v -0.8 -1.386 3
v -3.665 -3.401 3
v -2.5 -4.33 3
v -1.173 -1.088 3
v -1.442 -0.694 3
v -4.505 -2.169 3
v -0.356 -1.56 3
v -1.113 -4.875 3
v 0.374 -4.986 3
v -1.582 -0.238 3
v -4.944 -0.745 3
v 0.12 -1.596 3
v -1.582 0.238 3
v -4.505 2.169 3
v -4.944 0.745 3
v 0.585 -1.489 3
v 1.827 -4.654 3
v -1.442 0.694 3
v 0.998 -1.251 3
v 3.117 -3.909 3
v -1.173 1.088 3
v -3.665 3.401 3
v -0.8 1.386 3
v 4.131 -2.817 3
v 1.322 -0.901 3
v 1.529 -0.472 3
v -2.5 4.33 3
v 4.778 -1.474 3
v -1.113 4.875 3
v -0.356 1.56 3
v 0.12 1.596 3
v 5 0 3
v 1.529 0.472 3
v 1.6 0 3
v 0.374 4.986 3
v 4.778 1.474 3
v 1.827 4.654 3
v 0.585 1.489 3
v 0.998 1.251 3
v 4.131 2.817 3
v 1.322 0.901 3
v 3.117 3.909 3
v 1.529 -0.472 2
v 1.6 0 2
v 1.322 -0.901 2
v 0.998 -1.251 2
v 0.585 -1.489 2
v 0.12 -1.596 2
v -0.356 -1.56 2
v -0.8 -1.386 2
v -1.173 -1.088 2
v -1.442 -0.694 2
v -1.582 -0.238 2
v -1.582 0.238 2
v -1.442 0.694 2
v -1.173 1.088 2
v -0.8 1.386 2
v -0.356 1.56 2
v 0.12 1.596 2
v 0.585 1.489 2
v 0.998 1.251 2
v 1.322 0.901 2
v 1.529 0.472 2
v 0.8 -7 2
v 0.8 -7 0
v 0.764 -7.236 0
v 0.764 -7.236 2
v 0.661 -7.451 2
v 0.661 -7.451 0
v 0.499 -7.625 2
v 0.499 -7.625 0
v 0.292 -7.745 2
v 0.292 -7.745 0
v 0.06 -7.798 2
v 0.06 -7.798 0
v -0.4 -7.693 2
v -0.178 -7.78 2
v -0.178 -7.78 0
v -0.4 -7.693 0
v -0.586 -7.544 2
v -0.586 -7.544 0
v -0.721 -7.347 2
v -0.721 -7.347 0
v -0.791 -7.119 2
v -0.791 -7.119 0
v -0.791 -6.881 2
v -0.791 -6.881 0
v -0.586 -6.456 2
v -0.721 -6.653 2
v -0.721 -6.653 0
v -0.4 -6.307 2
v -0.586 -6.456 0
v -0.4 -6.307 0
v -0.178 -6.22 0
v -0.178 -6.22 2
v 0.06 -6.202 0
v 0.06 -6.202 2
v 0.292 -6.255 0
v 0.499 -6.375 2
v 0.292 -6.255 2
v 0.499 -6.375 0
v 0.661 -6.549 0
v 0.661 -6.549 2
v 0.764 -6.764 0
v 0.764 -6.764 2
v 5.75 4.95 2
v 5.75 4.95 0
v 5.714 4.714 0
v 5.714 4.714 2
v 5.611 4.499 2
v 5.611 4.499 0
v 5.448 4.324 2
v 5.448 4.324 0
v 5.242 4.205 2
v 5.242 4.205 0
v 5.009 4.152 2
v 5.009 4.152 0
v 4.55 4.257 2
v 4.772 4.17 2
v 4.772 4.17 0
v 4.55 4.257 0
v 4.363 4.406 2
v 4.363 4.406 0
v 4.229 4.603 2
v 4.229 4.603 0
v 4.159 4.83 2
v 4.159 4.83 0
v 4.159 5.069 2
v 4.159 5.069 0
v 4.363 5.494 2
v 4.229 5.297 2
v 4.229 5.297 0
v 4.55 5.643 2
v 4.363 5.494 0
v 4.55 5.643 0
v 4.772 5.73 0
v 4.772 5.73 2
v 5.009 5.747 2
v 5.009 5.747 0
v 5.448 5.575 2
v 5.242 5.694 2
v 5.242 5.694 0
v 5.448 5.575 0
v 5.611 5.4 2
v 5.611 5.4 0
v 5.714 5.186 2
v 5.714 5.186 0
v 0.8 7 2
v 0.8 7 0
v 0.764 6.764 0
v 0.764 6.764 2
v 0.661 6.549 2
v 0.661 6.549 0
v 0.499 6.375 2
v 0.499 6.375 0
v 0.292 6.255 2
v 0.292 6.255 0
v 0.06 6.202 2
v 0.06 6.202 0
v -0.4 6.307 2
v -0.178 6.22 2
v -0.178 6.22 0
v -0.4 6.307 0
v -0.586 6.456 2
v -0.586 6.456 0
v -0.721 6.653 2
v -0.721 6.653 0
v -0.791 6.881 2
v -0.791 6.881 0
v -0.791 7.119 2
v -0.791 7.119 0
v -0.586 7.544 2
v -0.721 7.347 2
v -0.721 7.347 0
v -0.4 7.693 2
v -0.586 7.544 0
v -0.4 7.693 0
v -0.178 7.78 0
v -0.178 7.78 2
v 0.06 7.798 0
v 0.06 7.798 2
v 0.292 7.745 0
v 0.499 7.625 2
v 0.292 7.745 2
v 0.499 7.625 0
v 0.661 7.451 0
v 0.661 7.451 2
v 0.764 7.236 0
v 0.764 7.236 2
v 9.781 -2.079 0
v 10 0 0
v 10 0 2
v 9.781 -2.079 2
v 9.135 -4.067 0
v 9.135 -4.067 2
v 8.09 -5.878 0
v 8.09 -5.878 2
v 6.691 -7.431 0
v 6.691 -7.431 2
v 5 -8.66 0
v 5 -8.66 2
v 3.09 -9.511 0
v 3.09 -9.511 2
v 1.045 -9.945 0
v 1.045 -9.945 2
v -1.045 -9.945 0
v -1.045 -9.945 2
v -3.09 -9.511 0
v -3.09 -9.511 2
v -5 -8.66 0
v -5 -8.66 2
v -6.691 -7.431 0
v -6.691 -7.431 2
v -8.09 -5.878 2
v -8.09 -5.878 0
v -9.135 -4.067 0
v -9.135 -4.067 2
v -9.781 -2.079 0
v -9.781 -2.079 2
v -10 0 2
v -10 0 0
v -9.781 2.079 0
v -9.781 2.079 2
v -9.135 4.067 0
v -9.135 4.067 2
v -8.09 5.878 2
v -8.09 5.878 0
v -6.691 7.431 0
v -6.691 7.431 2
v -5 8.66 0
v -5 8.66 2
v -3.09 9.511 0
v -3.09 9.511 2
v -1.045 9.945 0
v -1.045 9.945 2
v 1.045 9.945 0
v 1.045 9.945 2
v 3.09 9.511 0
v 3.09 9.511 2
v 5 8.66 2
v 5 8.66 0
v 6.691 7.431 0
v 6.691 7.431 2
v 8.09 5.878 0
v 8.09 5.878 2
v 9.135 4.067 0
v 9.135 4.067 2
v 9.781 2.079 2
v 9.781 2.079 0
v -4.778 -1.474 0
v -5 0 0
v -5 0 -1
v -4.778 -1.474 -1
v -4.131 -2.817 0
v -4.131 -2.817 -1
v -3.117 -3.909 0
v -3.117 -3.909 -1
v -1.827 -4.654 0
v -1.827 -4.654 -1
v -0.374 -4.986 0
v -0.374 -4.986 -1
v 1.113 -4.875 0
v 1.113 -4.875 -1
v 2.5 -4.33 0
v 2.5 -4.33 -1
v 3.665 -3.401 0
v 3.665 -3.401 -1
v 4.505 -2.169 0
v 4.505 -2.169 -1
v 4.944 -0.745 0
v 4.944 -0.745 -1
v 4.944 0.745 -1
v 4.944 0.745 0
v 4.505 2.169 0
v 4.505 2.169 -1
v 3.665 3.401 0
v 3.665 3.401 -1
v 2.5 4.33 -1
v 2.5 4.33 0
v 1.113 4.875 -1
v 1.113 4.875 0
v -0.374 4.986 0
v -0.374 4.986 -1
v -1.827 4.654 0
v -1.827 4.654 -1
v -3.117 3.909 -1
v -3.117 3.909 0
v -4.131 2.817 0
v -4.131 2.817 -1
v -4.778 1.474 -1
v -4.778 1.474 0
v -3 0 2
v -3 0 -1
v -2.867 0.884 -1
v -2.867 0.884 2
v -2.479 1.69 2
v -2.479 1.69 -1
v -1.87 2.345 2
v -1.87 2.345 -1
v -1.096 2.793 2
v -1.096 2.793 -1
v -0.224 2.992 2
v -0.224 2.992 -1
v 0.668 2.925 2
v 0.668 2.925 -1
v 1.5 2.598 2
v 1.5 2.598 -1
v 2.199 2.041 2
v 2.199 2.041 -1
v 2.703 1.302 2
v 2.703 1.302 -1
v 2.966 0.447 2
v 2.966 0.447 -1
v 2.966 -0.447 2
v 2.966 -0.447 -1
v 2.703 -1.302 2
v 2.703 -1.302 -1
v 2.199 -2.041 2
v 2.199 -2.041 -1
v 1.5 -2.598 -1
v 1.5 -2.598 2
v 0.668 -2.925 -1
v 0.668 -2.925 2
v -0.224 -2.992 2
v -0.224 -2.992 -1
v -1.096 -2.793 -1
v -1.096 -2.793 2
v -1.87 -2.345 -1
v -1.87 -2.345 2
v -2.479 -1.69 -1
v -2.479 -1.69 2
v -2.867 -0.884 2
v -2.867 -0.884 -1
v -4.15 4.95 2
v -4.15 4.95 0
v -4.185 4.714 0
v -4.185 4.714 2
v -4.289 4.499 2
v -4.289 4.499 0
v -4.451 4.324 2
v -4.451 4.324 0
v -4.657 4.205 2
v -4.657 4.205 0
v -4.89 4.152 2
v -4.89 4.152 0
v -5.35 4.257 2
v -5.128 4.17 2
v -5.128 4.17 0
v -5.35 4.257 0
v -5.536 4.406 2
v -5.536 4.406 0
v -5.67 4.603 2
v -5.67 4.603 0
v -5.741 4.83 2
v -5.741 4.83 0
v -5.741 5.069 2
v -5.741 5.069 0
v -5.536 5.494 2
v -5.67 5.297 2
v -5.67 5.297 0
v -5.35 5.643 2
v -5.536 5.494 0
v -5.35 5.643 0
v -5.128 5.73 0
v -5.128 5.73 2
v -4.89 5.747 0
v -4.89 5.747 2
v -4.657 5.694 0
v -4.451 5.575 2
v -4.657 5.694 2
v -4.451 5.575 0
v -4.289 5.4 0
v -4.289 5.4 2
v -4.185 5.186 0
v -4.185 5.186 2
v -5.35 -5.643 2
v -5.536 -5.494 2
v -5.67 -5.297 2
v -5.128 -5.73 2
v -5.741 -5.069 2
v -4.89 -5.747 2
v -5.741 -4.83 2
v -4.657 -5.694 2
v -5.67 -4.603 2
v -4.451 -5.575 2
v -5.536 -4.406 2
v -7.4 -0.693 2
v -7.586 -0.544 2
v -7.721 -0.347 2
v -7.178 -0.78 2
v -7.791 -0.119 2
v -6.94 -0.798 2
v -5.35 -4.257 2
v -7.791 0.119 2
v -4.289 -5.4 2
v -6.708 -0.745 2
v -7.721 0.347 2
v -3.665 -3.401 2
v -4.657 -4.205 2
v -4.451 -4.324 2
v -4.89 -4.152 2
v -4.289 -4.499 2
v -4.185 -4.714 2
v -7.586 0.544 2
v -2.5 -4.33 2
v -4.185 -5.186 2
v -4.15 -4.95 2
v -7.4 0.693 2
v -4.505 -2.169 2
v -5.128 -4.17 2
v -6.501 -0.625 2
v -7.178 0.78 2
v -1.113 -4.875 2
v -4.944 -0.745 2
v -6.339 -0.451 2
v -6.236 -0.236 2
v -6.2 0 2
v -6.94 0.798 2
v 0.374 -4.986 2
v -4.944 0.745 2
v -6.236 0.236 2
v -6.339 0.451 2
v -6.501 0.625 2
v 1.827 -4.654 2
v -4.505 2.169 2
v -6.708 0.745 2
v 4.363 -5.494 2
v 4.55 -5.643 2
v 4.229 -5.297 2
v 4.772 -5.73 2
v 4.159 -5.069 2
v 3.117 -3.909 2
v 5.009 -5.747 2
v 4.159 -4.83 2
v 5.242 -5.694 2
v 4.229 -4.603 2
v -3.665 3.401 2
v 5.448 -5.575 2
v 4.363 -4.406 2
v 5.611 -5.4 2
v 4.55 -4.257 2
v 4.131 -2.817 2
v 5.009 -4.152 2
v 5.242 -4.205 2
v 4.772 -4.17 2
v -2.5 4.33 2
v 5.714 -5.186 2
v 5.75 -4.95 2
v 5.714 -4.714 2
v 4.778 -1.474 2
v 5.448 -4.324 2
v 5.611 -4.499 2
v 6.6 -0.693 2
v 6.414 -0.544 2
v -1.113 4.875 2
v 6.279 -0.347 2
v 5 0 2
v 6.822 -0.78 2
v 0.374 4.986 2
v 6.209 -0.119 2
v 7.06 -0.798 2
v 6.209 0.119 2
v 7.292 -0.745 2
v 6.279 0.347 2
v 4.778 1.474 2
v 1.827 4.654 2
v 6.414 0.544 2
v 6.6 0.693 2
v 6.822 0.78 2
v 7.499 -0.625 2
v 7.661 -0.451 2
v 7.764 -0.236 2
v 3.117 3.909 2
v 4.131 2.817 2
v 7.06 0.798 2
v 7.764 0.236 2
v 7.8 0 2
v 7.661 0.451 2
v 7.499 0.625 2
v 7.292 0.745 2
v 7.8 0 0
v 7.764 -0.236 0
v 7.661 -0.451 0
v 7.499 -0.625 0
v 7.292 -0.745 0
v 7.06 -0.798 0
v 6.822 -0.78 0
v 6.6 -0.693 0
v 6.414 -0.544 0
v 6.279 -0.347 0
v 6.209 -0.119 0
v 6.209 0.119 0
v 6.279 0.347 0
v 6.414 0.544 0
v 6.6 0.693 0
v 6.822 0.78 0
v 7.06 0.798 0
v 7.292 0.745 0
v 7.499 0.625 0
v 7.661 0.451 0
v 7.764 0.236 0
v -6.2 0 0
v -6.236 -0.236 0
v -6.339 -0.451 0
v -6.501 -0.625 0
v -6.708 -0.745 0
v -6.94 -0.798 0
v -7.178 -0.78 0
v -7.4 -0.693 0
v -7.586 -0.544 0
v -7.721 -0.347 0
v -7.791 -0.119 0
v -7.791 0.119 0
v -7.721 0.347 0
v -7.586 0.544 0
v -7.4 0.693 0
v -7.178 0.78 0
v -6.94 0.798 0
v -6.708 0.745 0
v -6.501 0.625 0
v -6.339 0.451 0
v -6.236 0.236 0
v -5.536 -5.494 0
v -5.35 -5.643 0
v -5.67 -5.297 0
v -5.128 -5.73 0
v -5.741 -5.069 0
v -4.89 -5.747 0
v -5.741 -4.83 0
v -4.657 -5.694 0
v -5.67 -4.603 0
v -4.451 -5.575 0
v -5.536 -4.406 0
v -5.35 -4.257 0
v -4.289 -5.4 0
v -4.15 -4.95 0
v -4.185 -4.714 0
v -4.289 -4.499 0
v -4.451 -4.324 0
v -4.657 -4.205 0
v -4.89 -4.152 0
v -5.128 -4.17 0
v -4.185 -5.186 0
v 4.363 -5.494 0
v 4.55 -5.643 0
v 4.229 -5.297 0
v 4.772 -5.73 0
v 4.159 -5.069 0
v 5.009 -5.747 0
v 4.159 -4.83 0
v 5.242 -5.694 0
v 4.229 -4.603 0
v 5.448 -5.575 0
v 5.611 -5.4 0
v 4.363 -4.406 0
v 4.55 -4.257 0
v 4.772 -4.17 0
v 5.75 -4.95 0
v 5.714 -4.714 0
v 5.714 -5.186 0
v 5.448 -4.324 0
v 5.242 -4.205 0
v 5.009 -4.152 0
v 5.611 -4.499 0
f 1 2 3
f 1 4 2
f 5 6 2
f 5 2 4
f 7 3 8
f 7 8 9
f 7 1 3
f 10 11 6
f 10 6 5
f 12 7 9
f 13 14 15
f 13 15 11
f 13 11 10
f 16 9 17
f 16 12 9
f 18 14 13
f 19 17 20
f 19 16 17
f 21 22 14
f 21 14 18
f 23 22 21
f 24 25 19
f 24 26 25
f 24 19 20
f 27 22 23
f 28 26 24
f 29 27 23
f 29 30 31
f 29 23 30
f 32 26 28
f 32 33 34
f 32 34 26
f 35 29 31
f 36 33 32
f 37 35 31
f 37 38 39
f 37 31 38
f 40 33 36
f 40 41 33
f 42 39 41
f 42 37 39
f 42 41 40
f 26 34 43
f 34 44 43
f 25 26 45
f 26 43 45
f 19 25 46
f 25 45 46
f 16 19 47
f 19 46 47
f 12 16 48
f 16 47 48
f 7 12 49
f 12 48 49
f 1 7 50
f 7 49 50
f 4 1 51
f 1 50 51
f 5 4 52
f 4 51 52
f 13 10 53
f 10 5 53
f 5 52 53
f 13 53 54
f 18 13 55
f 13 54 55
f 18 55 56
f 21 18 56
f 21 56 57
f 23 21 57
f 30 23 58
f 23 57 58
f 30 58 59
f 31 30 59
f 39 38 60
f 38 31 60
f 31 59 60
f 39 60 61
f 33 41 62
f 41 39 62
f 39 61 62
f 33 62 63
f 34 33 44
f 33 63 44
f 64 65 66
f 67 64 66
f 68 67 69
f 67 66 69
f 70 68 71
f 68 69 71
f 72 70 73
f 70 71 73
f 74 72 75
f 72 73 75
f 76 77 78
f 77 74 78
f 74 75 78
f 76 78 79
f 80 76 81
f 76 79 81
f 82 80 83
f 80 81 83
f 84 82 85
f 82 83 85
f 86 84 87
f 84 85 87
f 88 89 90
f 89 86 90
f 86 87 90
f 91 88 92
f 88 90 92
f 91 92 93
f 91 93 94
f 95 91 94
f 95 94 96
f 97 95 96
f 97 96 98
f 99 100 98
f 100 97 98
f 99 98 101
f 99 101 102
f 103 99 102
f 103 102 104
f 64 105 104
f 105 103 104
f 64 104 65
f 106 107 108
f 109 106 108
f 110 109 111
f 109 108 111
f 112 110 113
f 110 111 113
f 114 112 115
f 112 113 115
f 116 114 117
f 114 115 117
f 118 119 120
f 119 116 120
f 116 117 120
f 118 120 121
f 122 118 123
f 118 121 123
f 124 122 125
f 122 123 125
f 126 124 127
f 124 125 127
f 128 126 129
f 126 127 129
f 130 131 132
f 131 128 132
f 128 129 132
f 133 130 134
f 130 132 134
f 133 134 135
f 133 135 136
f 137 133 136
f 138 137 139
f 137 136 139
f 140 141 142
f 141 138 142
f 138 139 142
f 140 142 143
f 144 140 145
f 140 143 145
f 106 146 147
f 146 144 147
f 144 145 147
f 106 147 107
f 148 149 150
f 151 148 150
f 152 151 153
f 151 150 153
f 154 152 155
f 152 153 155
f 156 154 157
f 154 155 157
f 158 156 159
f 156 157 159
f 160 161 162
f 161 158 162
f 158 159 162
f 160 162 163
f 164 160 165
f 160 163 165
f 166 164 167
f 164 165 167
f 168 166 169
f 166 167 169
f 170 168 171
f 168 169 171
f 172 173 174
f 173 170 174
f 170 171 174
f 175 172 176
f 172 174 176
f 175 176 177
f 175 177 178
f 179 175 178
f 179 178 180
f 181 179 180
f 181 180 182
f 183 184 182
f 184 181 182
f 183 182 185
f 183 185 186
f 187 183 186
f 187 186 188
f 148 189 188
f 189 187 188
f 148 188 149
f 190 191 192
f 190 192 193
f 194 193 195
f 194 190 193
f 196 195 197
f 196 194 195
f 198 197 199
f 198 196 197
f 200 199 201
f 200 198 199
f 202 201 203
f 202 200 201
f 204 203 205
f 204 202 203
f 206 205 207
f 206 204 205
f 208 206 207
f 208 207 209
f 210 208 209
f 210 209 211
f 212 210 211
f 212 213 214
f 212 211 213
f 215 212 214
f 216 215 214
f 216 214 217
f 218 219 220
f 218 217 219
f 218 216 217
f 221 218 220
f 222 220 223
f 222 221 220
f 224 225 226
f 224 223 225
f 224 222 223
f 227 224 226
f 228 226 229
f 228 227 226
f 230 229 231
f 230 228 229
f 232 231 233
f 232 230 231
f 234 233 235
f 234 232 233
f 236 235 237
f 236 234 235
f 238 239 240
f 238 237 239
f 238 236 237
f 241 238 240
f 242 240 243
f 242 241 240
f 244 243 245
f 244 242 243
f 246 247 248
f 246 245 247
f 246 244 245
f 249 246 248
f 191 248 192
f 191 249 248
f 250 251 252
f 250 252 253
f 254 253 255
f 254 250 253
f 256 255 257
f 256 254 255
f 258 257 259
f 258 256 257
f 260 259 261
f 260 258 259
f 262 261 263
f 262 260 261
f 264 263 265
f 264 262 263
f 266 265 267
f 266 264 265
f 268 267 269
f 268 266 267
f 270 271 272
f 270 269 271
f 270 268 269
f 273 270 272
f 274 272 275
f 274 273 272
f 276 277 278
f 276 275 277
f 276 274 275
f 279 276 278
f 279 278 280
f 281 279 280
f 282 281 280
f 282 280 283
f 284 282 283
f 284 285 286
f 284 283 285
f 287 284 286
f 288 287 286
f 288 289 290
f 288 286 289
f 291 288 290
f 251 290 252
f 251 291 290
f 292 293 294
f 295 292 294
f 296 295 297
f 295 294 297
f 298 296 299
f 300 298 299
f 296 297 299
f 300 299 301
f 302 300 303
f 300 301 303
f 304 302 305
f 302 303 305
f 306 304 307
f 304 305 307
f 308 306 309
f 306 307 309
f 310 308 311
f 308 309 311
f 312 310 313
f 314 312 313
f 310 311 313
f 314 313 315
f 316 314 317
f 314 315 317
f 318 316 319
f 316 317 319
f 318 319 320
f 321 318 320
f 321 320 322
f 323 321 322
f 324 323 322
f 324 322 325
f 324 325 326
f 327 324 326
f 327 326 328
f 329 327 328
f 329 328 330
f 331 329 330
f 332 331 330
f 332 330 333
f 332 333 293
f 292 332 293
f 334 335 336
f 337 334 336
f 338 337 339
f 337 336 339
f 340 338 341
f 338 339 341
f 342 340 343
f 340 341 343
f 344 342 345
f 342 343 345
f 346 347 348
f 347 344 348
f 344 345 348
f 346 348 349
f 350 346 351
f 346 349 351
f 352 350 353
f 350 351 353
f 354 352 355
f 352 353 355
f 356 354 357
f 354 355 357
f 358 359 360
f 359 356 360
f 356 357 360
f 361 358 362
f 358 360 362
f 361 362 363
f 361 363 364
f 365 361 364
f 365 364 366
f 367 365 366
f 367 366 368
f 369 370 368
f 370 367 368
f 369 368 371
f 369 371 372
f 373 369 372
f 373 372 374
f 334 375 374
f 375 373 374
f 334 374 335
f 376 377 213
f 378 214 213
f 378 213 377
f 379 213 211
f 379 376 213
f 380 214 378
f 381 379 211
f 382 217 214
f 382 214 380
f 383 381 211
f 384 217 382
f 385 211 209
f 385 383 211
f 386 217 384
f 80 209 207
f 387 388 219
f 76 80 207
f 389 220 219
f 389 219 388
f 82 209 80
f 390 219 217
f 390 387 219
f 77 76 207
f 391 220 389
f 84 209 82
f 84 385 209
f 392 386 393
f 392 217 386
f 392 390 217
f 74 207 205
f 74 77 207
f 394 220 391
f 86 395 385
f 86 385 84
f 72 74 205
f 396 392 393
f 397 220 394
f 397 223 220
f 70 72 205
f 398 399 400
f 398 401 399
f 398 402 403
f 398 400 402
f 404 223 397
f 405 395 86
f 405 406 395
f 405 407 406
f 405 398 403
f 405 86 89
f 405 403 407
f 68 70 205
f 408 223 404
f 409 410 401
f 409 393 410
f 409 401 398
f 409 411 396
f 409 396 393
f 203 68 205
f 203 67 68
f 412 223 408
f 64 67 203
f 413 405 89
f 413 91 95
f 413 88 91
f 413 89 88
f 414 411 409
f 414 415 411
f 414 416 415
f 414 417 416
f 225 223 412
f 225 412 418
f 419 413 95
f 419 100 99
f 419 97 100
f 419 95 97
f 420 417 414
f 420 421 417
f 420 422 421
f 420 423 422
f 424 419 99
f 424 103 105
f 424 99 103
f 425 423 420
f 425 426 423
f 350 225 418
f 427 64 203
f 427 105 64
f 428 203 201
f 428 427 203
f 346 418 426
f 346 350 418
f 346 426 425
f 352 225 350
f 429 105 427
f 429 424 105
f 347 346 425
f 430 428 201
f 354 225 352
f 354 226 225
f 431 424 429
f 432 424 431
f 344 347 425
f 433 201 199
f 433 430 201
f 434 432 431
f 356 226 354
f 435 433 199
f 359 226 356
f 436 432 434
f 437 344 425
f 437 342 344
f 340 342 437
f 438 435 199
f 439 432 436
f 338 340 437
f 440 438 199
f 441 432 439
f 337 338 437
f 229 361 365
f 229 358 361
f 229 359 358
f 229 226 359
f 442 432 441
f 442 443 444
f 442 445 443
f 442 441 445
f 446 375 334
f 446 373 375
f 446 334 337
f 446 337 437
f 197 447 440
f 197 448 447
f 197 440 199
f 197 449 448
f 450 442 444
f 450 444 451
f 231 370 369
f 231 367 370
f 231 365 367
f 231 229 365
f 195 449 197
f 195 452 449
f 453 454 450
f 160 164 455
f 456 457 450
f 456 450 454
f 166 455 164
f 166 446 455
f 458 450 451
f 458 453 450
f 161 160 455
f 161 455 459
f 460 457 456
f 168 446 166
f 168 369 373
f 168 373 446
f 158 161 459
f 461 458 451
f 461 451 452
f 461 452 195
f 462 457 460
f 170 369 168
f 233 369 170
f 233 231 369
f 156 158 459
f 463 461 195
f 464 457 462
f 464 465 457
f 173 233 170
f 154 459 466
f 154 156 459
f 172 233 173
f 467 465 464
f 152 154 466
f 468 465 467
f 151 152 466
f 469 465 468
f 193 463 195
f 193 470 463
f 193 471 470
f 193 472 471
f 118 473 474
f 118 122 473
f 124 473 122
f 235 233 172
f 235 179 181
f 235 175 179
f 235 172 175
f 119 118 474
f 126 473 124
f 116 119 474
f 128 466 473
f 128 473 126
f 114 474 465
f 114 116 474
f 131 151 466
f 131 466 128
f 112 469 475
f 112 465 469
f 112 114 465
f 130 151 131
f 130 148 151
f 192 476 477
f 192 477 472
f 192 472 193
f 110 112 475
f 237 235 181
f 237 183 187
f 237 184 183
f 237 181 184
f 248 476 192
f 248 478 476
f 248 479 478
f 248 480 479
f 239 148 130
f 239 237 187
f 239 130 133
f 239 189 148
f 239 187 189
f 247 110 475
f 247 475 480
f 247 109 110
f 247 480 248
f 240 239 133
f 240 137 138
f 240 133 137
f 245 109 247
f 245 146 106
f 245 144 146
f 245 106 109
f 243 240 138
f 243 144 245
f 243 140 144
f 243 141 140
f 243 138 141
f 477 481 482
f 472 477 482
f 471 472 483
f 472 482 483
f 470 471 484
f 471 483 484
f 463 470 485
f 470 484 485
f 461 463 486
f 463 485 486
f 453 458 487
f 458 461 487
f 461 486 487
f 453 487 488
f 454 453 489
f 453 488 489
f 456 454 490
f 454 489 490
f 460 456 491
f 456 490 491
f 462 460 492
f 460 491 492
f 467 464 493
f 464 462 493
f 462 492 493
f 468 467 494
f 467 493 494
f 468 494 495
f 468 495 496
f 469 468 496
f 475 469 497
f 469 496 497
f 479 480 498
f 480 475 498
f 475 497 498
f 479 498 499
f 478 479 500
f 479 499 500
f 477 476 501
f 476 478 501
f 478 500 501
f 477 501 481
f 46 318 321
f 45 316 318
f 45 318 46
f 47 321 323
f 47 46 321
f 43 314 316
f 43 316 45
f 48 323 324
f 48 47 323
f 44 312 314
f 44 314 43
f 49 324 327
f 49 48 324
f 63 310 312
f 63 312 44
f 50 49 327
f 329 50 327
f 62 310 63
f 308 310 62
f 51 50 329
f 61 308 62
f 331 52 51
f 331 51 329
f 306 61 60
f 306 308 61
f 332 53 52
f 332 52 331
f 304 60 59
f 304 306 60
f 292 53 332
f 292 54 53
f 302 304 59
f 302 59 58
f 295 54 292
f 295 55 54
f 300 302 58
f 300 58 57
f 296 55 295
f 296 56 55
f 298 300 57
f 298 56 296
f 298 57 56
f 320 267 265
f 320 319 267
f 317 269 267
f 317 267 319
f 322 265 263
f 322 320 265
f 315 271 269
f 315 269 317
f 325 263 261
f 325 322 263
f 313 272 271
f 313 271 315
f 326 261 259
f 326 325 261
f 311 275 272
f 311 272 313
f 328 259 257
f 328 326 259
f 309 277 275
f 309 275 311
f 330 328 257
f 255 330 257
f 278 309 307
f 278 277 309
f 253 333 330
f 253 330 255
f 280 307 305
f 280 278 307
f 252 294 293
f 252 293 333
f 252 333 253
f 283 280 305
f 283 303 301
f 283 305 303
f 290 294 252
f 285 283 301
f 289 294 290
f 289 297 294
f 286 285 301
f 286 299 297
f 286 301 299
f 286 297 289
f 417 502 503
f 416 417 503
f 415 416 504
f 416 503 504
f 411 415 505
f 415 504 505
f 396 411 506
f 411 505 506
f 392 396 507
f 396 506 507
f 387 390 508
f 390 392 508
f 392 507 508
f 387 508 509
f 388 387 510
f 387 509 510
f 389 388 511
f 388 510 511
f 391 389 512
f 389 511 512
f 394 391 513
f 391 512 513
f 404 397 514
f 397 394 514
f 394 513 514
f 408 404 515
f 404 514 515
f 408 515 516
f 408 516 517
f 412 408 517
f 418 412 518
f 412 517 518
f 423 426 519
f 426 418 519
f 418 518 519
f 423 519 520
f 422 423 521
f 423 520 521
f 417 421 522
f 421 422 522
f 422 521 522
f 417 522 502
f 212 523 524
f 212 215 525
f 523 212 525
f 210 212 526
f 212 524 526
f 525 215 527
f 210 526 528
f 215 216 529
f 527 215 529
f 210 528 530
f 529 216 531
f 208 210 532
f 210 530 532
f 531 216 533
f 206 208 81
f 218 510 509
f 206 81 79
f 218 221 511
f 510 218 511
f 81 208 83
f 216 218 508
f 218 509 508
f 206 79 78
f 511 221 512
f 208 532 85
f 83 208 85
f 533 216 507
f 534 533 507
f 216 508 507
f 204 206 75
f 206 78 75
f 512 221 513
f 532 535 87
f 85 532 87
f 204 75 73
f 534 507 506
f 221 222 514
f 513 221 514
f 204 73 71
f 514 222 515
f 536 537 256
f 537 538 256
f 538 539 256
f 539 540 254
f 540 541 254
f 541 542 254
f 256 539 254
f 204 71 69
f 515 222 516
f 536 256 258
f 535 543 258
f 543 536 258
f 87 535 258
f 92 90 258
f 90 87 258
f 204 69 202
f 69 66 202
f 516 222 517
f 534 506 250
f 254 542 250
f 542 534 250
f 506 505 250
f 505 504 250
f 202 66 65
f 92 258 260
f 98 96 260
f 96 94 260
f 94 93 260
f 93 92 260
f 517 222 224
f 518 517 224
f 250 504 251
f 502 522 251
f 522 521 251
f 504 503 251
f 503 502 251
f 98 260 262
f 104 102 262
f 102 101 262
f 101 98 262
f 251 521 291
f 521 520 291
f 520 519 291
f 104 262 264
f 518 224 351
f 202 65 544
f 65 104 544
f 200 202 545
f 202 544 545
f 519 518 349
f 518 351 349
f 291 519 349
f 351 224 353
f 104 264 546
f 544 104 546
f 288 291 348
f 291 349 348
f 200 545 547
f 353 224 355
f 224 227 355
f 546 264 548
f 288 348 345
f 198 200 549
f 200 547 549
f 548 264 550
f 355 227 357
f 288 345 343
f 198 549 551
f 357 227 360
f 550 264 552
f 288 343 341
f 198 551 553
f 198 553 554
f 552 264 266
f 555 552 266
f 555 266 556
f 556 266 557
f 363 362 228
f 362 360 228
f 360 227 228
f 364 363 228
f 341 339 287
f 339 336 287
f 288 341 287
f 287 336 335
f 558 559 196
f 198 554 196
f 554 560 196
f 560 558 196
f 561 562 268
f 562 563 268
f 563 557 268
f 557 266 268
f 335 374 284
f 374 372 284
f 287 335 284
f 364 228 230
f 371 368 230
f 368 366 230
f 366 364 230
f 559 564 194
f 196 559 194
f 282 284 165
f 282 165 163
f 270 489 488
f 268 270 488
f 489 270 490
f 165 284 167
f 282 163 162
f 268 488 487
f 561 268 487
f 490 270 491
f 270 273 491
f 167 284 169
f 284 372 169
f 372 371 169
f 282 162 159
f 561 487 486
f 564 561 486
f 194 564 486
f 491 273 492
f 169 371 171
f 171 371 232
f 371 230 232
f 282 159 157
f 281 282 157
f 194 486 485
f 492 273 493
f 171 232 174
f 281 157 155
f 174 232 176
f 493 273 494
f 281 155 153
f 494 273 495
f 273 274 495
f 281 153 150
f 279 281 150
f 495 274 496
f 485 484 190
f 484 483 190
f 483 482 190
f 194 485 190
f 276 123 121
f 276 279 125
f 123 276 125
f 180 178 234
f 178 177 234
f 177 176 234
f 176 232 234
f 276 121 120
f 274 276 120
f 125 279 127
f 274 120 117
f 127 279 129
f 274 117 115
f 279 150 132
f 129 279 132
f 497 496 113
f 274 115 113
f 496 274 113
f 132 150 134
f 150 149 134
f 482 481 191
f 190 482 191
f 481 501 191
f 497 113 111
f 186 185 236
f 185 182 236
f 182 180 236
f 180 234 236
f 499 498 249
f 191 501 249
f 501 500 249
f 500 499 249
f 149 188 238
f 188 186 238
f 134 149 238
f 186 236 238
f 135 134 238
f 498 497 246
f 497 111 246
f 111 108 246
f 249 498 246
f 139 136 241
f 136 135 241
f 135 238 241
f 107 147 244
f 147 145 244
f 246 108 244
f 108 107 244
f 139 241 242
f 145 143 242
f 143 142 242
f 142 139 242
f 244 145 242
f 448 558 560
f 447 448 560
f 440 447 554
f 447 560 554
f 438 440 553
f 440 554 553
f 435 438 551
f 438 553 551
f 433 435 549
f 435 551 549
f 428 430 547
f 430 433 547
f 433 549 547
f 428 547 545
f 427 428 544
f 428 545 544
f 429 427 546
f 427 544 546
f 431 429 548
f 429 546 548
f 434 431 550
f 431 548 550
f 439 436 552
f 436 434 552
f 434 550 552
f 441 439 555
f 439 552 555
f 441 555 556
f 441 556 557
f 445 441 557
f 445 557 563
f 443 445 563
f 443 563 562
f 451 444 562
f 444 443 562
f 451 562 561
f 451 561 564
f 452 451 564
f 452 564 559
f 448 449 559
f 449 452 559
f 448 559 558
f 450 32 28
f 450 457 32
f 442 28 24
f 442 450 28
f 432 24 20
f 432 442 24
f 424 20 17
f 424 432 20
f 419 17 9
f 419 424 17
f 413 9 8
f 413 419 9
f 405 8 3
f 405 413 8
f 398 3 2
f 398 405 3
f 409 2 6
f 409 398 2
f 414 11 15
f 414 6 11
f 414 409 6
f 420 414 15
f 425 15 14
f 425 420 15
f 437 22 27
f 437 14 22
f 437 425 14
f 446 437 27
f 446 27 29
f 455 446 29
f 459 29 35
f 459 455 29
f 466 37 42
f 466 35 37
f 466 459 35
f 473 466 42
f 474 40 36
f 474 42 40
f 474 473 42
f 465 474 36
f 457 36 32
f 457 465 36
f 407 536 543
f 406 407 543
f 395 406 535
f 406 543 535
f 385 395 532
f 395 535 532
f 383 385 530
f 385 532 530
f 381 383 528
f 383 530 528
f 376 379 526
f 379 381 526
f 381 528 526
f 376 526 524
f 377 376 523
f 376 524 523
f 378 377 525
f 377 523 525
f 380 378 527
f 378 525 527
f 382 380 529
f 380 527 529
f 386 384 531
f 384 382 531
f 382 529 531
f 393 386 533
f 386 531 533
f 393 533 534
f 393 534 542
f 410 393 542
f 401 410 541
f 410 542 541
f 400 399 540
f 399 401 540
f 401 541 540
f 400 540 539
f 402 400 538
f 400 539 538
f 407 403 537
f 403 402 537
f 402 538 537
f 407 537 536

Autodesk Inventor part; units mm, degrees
ref_plane "YZ Plane" through (0, 0, 0) normal (1, 0, 0) x (0, 1, 0)
ref_plane "XZ Plane" through (0, 0, 0) normal (0, 1, 0) x (-1, 0, 0)
ref_plane "XY Plane" through (0, 0, 0) normal (0, 0, 1) x (1, 0, 0)
sketch "スケッチ1" plane through (0, 0, 0) normal (0, 0, 1) x (1, 0, 0)
  circle A0 centre (0, 0) radius 10
  circle A1 centre (0, 0) radius 1.6
  circle A2 centre (0, 0) radius 7 construction
  circle A3 centre (0, 7) radius 0.8
  line L0 (0, 7) -> (0, 0) construction
  circle A4 centre (-4.9497, 4.9497) radius 0.8
  circle A5 centre (-7, 0) radius 0.8
  circle A6 centre (-4.9497, -4.9497) radius 0.8
  circle A7 centre (0, -7) radius 0.8
  circle A8 centre (4.9497, -4.9497) radius 0.8
  circle A9 centre (7, 0) radius 0.8
  circle A10 centre (4.9497, 4.9497) radius 0.8
  dimension "d2" = 14
  dimension "d0" = 20
  dimension "d1" = 3.2
  dimension "d3" = 1.6
  dimension "d6" = 360
extrude "押し出し1" add sketch "スケッチ1" along normal blind 2
sketch "スケッチ2" plane through (0, 0, 2) normal (0, 0, 1) x (1, 0, 0)
  circle A0 centre (0, 0) radius 1.6 projected
  circle A1 centre (0, 0) radius 10 projected
  circle A2 centre (0, 0) radius 5
  dimension "d10" = 10
extrude "押し出し2" add sketch "スケッチ2" along normal blind 1 contours A2
sketch "スケッチ3" plane through (0, 0, 0) normal (0, 0, -1) x (-1, 0, 0)
  circle A0 centre (0, 0) radius 1.6 projected
  circle A1 centre (0, 0) radius 10 projected
  circle A2 centre (0, 0) radius 5
  dimension "d13" = 10
extrude "押し出し3" add sketch "スケッチ3" along normal blind 1 contours A2
sketch "スケッチ4" plane through (0, 0, -1) normal (0, 0, -1) x (-1, 0, 0)
  circle A0 centre (0, 0) radius 1.6 projected
  circle A1 centre (0, 0) radius 5 projected
  circle A2 centre (0, 0) radius 3
  dimension "d16" = 6
extrude "押し出し4" cut sketch "スケッチ4" against normal blind 3 contours A2
properties part number "アルミローハイトサーボホーン" material "アルミニウム 2014-T4"
